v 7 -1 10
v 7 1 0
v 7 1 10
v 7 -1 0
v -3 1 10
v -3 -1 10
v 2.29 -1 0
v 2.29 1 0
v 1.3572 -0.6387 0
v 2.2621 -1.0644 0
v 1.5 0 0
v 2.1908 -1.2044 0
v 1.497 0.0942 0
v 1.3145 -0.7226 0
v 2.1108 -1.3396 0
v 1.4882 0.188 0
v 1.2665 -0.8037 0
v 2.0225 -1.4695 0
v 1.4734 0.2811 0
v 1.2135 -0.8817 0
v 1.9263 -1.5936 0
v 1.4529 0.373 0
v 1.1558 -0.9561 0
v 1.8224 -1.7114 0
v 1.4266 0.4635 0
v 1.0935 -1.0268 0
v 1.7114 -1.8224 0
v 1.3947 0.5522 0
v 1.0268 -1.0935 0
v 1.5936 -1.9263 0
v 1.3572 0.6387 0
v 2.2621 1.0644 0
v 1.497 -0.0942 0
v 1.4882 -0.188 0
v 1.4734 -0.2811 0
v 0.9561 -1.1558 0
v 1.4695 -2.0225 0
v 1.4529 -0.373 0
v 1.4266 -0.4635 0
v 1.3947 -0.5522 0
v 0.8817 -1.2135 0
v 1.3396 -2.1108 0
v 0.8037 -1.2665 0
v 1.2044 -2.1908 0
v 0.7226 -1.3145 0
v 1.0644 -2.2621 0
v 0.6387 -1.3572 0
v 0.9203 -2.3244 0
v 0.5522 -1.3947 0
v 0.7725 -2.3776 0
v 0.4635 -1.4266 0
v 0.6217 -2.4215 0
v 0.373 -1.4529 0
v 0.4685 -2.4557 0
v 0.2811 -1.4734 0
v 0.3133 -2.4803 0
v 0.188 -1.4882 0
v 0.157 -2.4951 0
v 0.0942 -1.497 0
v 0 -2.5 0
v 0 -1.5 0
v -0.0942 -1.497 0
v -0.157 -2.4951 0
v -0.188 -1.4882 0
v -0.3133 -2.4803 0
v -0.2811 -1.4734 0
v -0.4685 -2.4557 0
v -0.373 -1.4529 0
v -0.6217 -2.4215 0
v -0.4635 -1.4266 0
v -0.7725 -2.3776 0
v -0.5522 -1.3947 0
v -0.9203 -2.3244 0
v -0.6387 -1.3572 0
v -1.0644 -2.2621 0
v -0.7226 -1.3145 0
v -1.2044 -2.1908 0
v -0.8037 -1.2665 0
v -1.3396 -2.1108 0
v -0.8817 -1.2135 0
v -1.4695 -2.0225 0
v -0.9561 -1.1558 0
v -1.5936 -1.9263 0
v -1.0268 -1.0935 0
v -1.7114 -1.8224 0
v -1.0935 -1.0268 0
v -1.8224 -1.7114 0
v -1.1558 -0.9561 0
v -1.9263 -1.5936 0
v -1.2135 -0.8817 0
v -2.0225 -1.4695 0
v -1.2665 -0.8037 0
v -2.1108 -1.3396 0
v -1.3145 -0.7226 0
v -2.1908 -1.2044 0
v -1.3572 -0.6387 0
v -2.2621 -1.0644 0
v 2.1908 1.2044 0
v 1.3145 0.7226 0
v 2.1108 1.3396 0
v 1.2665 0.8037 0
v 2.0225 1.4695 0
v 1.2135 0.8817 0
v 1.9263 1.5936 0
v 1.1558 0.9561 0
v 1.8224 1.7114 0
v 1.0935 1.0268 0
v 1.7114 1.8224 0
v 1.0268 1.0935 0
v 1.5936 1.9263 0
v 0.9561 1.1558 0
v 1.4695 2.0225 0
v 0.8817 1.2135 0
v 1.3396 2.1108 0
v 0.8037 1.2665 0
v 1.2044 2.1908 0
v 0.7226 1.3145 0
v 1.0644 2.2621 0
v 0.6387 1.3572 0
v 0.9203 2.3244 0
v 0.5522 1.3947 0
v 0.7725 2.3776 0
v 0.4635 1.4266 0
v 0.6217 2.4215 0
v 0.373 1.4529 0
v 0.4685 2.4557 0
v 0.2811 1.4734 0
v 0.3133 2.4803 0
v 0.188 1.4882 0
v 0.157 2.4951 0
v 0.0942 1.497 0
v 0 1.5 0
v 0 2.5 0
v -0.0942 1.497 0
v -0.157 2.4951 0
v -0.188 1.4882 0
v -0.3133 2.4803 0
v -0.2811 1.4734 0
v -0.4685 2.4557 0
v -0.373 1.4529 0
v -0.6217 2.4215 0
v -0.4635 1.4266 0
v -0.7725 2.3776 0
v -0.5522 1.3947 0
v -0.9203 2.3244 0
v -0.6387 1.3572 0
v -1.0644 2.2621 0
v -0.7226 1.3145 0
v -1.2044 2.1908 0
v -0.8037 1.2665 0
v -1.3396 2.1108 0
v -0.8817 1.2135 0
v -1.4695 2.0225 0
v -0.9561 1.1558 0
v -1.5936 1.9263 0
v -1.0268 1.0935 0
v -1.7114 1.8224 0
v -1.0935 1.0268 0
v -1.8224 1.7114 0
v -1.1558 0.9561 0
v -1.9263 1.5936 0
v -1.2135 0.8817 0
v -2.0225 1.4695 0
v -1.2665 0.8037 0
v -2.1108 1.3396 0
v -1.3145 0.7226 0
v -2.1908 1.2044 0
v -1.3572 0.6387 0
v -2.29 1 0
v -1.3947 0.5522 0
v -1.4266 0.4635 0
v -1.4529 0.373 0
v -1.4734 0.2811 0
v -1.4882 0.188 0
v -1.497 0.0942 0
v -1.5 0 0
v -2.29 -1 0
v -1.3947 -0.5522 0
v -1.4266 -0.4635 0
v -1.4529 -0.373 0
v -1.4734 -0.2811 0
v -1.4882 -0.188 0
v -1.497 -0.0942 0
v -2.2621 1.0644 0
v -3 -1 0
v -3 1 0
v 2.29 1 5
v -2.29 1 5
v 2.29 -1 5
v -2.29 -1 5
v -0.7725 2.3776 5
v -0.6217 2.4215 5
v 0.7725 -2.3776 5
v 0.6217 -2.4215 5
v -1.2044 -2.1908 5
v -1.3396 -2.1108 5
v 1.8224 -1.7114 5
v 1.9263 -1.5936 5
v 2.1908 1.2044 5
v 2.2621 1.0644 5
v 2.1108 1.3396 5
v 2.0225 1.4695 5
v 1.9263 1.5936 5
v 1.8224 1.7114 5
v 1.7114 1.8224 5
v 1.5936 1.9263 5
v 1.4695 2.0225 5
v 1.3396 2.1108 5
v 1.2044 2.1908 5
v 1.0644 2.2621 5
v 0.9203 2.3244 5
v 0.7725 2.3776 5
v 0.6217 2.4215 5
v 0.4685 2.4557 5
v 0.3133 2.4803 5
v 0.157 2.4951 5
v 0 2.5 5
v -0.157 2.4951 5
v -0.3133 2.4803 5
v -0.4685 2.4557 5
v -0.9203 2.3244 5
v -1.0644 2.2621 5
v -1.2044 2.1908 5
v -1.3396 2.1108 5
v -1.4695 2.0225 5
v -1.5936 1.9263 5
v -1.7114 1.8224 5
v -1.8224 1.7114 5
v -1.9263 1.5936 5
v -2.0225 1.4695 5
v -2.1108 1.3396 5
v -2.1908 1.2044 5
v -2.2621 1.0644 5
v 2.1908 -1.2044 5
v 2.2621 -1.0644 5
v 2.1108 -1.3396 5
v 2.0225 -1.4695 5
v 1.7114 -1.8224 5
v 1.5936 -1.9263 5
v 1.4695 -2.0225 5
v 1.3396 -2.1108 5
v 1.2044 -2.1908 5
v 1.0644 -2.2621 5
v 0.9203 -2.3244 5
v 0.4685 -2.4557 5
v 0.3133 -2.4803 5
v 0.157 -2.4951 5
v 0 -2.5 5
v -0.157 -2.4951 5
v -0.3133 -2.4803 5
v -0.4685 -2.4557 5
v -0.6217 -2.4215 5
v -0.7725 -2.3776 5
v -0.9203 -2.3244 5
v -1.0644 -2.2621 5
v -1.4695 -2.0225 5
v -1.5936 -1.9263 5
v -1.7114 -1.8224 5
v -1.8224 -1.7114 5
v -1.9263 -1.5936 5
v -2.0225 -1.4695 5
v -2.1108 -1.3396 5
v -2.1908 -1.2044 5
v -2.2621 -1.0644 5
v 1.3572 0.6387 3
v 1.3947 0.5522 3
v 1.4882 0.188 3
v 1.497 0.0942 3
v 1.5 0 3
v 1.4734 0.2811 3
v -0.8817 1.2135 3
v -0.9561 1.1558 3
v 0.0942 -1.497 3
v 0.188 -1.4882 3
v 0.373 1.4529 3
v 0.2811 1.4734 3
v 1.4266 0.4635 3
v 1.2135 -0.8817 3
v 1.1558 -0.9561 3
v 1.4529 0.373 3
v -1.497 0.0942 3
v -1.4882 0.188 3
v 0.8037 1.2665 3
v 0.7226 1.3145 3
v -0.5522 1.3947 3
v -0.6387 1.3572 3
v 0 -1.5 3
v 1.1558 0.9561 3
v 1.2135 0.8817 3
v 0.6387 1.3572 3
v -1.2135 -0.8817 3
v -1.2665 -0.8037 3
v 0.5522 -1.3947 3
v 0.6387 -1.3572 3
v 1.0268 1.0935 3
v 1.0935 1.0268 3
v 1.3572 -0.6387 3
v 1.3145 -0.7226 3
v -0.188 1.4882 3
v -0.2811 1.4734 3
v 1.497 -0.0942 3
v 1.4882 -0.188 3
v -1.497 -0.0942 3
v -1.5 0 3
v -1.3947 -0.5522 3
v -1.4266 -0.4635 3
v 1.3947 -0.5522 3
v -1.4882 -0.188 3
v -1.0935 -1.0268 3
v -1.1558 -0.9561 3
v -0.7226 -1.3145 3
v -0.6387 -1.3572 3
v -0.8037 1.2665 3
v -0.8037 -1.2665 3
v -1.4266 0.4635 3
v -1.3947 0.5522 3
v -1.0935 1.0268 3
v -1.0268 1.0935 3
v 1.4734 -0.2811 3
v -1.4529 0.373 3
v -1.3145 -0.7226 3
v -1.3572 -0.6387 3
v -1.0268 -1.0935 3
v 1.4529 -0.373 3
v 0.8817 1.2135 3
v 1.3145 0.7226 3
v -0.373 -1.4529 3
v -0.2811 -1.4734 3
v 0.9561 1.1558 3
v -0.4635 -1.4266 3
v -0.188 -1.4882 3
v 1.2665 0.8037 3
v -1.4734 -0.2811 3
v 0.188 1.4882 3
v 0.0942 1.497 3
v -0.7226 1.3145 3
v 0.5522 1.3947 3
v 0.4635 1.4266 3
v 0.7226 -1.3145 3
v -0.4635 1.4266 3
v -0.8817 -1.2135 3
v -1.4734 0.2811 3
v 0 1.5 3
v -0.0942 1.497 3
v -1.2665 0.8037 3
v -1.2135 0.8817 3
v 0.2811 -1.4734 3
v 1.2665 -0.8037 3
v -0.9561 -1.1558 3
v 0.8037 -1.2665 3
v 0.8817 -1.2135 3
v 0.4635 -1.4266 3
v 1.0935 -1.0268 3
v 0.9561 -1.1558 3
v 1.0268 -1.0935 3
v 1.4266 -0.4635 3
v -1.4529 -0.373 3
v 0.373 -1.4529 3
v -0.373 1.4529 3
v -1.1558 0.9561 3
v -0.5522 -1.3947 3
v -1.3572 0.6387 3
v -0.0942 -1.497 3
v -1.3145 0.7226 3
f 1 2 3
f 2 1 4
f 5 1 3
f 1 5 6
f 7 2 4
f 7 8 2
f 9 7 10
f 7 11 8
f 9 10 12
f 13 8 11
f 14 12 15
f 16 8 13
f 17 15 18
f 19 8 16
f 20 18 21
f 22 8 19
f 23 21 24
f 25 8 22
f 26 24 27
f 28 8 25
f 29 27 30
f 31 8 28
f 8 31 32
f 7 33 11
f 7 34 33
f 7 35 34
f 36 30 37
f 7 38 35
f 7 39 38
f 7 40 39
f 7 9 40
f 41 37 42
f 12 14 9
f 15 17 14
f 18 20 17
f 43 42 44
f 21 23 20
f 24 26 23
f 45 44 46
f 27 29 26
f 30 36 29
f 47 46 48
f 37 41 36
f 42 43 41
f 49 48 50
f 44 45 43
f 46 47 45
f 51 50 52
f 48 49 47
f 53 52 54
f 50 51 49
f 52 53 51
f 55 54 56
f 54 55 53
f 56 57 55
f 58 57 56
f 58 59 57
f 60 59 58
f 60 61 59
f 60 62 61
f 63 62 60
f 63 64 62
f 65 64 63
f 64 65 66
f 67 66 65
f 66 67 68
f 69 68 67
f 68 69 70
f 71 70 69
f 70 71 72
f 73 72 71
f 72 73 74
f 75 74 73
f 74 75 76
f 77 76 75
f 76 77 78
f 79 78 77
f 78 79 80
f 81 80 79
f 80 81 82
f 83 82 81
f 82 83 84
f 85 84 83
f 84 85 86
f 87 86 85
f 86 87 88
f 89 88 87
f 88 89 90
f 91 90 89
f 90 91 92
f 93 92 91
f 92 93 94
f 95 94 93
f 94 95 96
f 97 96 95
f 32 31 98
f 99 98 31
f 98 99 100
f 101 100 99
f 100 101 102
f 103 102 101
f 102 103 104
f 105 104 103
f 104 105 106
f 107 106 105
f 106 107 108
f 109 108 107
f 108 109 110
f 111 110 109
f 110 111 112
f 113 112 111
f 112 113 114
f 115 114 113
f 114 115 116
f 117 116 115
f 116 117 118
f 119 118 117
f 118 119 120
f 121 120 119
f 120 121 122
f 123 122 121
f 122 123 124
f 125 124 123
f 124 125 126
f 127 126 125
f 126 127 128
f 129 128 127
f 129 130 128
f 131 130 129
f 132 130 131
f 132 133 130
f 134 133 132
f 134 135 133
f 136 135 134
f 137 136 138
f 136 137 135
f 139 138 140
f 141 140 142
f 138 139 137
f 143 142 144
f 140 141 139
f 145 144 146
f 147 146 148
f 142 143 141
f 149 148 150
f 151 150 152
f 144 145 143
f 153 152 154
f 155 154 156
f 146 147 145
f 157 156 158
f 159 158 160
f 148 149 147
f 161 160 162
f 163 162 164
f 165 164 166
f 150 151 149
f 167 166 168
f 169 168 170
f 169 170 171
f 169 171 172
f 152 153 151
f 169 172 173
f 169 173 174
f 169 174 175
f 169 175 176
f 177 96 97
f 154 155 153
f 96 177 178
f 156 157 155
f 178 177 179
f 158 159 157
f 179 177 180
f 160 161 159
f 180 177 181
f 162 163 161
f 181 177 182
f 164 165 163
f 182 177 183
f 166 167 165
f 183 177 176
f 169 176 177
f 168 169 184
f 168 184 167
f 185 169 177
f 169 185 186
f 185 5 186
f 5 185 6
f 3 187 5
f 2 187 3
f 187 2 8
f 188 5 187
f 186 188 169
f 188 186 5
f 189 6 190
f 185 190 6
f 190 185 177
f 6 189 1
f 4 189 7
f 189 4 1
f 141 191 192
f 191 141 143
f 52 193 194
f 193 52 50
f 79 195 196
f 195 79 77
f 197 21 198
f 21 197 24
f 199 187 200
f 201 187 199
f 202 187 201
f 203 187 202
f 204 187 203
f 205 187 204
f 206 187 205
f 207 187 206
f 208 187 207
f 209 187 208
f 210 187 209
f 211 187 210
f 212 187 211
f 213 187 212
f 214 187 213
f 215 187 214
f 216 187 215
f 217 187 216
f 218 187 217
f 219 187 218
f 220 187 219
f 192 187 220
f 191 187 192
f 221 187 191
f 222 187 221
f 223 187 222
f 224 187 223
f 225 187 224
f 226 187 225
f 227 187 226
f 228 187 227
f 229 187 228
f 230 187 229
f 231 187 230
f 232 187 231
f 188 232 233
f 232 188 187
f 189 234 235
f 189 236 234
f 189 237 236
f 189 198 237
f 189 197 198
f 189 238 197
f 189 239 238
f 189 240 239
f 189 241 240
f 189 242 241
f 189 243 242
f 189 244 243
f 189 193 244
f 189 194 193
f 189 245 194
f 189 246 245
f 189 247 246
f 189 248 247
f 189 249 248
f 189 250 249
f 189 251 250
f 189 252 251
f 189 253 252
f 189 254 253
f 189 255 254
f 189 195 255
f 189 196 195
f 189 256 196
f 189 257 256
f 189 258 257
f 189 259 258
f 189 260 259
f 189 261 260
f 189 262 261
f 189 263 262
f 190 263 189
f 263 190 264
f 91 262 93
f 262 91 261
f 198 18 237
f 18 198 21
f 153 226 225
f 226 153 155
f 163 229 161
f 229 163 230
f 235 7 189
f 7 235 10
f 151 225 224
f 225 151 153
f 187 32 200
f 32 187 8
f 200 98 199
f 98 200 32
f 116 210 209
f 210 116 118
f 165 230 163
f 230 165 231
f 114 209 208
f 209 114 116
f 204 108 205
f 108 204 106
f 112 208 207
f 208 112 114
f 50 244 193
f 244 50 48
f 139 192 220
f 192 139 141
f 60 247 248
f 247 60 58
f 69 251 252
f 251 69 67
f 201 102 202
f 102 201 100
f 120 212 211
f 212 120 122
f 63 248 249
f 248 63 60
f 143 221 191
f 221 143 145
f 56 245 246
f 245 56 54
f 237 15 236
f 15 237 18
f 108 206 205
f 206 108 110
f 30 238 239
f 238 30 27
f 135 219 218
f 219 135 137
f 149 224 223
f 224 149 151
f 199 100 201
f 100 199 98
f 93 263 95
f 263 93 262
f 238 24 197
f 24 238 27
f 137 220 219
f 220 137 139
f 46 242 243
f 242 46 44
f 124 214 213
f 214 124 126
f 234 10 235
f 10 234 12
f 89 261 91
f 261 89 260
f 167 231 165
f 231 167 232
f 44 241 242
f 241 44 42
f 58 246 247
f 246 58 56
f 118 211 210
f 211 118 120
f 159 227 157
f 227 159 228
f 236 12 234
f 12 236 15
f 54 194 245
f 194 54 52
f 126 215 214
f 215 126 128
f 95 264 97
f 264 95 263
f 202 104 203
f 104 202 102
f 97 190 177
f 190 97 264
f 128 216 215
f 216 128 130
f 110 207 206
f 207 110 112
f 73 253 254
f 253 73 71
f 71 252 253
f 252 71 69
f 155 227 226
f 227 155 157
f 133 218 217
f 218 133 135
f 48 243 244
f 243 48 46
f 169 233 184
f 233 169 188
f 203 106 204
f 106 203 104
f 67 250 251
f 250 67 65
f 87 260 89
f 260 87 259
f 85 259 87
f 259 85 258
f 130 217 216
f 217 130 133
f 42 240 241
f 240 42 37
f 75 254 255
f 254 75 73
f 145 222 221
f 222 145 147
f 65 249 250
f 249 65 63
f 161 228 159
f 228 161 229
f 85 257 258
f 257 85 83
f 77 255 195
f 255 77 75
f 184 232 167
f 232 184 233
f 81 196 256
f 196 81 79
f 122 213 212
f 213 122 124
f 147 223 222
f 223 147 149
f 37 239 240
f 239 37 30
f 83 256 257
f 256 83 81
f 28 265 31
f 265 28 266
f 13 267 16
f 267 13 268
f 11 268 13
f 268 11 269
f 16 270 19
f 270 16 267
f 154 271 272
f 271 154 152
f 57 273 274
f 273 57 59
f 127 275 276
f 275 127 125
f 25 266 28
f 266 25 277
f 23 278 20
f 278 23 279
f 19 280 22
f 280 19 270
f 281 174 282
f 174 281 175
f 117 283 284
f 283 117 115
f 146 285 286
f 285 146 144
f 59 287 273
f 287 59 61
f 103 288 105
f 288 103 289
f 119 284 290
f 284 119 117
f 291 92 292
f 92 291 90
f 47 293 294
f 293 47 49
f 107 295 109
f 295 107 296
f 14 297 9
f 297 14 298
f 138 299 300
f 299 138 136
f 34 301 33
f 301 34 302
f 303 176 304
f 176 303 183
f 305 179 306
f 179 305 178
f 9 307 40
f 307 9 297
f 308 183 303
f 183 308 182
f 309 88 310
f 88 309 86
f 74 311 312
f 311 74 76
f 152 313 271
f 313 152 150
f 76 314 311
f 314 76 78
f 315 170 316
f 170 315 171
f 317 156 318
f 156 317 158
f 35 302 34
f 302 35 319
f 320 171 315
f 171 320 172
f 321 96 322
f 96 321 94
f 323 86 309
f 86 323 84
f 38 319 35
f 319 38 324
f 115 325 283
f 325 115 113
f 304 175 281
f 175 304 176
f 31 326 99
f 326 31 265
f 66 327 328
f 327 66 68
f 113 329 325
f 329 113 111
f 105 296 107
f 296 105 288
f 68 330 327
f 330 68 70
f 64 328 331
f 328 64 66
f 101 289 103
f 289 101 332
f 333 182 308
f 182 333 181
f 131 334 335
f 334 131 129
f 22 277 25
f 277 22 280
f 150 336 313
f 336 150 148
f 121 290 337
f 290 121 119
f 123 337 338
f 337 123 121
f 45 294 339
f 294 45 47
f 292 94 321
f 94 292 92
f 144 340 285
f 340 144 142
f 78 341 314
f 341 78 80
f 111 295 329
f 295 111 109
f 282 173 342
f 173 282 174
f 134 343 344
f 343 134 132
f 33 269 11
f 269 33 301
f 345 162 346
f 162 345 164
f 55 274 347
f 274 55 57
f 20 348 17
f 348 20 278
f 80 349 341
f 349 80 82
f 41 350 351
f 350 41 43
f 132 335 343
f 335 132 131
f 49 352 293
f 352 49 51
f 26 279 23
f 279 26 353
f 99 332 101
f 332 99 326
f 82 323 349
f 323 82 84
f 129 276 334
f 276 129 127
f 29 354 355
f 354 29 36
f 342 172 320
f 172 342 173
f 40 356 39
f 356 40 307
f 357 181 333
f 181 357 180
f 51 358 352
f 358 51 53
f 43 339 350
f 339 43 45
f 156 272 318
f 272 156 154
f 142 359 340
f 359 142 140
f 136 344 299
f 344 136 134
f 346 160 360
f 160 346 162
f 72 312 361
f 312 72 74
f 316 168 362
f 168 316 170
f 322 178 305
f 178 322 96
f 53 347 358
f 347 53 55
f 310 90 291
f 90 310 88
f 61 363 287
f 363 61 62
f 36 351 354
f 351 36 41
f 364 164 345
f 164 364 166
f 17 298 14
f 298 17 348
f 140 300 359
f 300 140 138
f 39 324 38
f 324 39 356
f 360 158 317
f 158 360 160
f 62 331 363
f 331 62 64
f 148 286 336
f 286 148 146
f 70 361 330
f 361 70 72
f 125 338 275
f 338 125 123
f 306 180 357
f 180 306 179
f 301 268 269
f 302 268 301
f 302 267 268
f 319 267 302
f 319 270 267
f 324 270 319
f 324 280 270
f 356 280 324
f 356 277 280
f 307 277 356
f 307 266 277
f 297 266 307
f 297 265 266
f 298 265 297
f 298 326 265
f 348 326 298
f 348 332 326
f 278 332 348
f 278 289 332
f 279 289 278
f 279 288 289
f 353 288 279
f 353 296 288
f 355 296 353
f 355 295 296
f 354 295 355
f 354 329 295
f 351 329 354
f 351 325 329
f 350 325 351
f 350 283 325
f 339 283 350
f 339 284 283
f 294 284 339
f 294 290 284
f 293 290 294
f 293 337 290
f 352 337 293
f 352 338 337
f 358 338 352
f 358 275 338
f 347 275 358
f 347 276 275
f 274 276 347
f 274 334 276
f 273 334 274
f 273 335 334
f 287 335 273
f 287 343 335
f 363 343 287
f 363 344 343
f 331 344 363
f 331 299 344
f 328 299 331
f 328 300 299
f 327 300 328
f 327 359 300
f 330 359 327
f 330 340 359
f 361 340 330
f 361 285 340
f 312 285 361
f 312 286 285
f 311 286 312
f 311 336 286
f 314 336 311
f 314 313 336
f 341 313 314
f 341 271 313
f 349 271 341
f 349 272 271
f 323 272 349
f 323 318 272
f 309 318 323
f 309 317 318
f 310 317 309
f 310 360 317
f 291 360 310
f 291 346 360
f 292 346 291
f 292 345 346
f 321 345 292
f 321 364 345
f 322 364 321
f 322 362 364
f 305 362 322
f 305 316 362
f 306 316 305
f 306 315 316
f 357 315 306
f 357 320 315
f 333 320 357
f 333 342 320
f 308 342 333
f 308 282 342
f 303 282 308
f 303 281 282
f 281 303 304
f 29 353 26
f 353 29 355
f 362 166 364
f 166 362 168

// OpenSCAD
$fn=100;

difference(){
union(){
	translate([-3,-1,0]) cube([10,2,10]);
	cylinder(r=2.5,h=5);
}

translate([0,0,-1])
cylinder(r=1.5,h=4);
}
